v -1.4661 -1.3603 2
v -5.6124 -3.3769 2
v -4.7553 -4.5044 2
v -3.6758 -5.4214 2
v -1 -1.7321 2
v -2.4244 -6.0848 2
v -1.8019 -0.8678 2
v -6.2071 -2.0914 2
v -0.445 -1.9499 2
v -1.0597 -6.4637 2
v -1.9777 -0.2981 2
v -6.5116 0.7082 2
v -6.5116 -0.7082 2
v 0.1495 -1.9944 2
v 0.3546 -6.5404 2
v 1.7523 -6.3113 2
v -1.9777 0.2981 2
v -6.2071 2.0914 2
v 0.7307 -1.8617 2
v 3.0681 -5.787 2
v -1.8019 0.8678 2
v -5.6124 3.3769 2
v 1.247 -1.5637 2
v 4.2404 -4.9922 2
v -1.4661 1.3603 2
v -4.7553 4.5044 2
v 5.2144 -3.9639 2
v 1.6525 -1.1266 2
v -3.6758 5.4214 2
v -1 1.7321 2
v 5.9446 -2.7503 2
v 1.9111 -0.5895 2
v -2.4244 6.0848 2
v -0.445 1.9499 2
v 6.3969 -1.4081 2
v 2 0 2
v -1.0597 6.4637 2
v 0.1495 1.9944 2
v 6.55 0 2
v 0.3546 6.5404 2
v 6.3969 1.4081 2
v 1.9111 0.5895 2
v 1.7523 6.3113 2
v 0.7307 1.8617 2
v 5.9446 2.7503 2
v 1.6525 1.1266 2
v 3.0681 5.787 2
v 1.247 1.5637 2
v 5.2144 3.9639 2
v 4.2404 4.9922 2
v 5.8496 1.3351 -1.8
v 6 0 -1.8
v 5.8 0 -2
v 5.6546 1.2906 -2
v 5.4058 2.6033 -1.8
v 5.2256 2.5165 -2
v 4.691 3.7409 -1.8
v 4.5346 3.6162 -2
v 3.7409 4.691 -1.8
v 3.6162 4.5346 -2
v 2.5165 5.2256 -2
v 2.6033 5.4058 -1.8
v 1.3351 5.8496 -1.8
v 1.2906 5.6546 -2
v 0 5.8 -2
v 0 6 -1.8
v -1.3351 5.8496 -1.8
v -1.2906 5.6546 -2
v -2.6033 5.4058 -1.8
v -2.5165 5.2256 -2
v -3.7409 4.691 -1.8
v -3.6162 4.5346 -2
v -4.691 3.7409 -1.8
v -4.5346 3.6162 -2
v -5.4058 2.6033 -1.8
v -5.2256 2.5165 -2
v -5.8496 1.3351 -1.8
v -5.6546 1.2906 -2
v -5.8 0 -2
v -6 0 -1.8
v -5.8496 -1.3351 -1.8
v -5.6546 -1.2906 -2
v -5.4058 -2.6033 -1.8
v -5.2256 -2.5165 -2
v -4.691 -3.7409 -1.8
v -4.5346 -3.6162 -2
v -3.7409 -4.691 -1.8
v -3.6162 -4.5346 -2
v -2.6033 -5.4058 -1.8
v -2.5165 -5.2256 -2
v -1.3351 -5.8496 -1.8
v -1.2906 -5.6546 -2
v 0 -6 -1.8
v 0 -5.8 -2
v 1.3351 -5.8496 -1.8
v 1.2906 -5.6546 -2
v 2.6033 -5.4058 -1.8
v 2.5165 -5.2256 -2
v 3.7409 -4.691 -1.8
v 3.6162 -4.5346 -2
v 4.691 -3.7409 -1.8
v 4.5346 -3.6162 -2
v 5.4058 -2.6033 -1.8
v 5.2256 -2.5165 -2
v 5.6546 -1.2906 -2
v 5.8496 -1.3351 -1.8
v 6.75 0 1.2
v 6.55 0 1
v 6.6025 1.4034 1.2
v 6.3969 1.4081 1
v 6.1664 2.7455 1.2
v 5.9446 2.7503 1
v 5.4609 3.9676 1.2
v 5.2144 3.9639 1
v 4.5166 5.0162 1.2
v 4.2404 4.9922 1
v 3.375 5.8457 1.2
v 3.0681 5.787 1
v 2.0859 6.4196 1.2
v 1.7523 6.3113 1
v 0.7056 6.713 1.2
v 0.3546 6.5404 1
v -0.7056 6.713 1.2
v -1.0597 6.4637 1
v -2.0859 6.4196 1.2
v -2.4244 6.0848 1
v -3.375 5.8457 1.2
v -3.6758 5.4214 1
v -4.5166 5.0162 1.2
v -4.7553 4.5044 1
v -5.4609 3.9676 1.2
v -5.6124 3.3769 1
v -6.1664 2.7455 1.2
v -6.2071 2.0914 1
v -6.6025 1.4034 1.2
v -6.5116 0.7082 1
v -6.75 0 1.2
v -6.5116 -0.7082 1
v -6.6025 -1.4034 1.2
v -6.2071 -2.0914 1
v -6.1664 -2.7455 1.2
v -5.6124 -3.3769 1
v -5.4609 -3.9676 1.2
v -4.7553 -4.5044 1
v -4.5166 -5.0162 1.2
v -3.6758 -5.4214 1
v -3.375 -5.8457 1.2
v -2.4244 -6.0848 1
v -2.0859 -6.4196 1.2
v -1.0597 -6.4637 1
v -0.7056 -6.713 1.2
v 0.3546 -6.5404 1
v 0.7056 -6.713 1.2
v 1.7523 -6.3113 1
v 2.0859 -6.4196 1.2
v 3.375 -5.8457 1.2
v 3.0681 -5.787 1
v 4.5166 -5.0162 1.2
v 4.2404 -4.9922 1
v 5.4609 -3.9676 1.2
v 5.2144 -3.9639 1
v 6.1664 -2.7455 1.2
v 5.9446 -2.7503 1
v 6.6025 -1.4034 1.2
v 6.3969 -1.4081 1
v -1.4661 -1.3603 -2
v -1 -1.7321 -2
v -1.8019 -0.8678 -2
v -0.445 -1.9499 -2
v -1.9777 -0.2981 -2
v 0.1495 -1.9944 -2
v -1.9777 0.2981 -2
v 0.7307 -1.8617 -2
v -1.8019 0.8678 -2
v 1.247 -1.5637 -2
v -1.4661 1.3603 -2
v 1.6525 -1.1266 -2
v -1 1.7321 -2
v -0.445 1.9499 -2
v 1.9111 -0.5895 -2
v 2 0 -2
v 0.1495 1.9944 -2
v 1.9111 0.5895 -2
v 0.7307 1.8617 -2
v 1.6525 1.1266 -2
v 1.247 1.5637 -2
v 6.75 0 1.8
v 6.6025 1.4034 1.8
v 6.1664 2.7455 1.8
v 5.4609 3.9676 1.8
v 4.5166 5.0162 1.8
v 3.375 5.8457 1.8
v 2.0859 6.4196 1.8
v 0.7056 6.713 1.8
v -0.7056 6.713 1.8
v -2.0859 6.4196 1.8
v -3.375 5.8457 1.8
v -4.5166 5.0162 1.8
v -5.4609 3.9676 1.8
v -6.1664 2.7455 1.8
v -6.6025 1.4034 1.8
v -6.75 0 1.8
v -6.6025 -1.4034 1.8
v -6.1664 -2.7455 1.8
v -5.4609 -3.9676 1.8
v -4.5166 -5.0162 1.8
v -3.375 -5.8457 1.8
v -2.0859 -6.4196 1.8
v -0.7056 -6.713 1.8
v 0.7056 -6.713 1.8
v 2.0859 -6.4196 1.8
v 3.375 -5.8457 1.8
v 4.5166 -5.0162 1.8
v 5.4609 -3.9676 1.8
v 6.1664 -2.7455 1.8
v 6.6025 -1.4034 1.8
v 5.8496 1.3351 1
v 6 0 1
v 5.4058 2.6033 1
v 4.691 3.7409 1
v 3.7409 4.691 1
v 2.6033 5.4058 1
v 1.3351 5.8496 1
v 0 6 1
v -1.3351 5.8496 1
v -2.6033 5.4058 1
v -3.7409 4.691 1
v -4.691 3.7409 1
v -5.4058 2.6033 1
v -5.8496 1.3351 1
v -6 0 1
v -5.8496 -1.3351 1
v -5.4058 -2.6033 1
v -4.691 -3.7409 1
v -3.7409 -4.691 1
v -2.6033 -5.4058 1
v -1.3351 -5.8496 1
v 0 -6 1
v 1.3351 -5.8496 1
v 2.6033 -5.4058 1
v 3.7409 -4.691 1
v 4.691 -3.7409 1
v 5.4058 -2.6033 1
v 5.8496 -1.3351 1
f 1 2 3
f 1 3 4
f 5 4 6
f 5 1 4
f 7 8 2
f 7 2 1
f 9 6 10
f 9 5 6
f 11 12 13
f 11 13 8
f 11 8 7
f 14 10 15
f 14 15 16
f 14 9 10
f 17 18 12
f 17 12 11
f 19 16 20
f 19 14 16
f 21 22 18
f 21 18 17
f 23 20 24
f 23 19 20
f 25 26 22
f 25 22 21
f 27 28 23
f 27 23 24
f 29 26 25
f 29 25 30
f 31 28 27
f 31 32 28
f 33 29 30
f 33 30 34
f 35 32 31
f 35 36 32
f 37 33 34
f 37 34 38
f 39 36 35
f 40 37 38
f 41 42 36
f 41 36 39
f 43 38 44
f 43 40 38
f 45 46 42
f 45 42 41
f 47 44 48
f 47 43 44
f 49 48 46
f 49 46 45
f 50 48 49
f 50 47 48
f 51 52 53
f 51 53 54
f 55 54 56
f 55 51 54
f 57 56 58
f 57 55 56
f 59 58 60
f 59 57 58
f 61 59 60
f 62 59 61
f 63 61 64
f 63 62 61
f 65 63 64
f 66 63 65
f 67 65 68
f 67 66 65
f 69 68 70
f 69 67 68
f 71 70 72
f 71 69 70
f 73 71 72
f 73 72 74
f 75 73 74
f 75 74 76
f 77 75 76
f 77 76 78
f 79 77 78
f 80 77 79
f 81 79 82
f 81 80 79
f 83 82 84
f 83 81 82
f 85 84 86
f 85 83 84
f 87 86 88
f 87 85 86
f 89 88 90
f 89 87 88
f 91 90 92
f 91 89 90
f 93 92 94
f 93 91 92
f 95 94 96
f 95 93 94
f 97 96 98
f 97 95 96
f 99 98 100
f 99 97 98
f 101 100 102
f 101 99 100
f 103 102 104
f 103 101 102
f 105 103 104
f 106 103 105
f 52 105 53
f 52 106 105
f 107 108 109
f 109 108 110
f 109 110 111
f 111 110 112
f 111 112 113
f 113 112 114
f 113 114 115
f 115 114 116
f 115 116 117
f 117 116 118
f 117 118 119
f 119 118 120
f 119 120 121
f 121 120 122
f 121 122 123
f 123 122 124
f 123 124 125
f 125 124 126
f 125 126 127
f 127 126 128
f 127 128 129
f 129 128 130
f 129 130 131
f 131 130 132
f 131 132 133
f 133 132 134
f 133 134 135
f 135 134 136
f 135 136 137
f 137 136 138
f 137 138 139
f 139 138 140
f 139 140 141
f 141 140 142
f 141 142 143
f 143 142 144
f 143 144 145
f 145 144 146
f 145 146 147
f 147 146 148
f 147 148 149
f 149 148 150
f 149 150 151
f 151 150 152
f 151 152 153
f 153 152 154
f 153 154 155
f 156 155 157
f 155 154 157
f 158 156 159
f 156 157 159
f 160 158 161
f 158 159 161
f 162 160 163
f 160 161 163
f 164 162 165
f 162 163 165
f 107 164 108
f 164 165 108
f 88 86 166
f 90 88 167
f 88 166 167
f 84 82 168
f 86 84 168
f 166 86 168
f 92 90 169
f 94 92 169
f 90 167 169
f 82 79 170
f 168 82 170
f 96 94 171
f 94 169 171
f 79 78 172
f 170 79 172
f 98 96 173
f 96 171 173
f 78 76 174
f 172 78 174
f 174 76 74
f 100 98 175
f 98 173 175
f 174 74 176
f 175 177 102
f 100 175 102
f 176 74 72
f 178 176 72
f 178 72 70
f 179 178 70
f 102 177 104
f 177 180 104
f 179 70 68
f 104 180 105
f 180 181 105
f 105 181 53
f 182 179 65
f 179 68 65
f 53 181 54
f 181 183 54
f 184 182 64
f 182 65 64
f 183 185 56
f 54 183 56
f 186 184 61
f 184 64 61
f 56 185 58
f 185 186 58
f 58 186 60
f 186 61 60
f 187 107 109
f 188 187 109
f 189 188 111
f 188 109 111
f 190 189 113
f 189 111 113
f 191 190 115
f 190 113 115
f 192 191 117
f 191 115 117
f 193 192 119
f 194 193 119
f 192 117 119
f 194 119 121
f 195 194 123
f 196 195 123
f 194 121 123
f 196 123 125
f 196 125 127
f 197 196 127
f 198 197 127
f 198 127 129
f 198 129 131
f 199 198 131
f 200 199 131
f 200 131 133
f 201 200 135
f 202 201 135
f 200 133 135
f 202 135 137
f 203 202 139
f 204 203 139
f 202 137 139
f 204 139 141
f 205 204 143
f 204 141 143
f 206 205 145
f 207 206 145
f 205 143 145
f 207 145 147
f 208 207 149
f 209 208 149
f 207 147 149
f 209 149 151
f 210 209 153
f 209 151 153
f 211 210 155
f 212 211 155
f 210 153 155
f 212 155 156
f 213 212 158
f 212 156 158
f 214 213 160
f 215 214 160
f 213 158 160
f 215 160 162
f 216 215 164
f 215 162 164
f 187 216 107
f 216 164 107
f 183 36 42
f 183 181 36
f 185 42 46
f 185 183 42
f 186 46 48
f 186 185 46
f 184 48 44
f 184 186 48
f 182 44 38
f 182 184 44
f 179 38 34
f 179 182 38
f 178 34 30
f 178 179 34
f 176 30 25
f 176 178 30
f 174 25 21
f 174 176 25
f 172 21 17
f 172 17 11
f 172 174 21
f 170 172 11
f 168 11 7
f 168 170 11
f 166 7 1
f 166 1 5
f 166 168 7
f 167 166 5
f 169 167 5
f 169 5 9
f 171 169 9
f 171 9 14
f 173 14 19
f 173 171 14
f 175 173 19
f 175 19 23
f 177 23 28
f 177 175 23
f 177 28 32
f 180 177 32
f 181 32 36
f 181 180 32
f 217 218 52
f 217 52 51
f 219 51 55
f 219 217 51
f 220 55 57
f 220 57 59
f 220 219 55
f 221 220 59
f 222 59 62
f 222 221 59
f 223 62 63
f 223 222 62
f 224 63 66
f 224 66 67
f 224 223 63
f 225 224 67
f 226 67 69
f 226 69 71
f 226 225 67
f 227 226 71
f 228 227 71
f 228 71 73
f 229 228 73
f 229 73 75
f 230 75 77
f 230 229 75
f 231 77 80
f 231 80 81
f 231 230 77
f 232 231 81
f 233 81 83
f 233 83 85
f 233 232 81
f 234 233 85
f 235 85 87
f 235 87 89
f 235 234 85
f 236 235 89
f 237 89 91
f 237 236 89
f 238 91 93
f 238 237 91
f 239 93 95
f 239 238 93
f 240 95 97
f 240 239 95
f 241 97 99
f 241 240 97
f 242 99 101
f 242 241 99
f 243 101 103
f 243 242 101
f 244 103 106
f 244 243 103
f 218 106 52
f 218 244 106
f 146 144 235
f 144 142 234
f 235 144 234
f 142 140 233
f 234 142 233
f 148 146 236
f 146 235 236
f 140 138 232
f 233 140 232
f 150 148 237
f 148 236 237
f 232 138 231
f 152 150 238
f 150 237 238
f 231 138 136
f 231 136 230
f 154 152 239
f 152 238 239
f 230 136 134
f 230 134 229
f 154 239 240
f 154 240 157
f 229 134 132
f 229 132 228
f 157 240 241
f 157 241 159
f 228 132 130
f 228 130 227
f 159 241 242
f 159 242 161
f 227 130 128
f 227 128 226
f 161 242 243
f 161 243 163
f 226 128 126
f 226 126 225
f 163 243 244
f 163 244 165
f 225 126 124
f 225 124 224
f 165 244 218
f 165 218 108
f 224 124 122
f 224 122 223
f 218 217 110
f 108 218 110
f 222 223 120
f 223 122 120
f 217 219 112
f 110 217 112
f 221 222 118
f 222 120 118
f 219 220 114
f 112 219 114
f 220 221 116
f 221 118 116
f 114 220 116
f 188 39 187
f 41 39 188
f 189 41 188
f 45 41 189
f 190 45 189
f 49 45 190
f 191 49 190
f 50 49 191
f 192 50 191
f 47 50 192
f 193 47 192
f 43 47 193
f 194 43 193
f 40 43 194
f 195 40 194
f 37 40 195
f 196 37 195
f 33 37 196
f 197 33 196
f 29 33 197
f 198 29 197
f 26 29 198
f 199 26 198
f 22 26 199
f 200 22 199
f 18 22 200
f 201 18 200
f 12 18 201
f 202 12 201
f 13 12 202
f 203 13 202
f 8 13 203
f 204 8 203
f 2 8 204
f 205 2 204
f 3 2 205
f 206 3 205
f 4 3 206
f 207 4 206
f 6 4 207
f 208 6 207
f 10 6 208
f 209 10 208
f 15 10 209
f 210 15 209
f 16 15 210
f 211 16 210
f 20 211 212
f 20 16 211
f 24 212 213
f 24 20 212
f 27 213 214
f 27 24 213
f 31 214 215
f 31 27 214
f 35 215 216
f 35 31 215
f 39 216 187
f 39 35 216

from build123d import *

# Parameters (mm, degrees)
SKETCH_1_R      = 6
SKETCH_1_R_2    = 2
EXTRUDE_1_DEPTH = 2
EXTRUDE_START   = -1
SKETCH_2_R      = 6.75
SKETCH_2_R_2    = 2
EXTRUDE_2_DEPTH = 1
CHAMFER_1_SIZE  = 0.2


with BuildPart() as part:
    # 草图1 → 凸台-拉伸1 (new, symmetric)
    with BuildSketch(Plane.XY):
        Circle(SKETCH_1_R)
        Circle(SKETCH_1_R_2, mode=Mode.SUBTRACT)
    extrude(amount=EXTRUDE_1_DEPTH, both=True)

    # 草图2 → 凸台-拉伸2 (add)
    with BuildSketch(Plane.XY.offset(2).offset(EXTRUDE_START)):
        Circle(SKETCH_2_R)
        Circle(SKETCH_2_R_2, mode=Mode.SUBTRACT)
    extrude(amount=EXTRUDE_2_DEPTH)

    # 倒角1
    chamfer_1_edges = [part.edges().sort_by_distance(p)[0] for p in [
        (-6.75, 0, 2),
        (-6.75, 0, 1),
        (-6, 0, -2),
    ]]
    chamfer(chamfer_1_edges, length=CHAMFER_1_SIZE)


solid = part.part
